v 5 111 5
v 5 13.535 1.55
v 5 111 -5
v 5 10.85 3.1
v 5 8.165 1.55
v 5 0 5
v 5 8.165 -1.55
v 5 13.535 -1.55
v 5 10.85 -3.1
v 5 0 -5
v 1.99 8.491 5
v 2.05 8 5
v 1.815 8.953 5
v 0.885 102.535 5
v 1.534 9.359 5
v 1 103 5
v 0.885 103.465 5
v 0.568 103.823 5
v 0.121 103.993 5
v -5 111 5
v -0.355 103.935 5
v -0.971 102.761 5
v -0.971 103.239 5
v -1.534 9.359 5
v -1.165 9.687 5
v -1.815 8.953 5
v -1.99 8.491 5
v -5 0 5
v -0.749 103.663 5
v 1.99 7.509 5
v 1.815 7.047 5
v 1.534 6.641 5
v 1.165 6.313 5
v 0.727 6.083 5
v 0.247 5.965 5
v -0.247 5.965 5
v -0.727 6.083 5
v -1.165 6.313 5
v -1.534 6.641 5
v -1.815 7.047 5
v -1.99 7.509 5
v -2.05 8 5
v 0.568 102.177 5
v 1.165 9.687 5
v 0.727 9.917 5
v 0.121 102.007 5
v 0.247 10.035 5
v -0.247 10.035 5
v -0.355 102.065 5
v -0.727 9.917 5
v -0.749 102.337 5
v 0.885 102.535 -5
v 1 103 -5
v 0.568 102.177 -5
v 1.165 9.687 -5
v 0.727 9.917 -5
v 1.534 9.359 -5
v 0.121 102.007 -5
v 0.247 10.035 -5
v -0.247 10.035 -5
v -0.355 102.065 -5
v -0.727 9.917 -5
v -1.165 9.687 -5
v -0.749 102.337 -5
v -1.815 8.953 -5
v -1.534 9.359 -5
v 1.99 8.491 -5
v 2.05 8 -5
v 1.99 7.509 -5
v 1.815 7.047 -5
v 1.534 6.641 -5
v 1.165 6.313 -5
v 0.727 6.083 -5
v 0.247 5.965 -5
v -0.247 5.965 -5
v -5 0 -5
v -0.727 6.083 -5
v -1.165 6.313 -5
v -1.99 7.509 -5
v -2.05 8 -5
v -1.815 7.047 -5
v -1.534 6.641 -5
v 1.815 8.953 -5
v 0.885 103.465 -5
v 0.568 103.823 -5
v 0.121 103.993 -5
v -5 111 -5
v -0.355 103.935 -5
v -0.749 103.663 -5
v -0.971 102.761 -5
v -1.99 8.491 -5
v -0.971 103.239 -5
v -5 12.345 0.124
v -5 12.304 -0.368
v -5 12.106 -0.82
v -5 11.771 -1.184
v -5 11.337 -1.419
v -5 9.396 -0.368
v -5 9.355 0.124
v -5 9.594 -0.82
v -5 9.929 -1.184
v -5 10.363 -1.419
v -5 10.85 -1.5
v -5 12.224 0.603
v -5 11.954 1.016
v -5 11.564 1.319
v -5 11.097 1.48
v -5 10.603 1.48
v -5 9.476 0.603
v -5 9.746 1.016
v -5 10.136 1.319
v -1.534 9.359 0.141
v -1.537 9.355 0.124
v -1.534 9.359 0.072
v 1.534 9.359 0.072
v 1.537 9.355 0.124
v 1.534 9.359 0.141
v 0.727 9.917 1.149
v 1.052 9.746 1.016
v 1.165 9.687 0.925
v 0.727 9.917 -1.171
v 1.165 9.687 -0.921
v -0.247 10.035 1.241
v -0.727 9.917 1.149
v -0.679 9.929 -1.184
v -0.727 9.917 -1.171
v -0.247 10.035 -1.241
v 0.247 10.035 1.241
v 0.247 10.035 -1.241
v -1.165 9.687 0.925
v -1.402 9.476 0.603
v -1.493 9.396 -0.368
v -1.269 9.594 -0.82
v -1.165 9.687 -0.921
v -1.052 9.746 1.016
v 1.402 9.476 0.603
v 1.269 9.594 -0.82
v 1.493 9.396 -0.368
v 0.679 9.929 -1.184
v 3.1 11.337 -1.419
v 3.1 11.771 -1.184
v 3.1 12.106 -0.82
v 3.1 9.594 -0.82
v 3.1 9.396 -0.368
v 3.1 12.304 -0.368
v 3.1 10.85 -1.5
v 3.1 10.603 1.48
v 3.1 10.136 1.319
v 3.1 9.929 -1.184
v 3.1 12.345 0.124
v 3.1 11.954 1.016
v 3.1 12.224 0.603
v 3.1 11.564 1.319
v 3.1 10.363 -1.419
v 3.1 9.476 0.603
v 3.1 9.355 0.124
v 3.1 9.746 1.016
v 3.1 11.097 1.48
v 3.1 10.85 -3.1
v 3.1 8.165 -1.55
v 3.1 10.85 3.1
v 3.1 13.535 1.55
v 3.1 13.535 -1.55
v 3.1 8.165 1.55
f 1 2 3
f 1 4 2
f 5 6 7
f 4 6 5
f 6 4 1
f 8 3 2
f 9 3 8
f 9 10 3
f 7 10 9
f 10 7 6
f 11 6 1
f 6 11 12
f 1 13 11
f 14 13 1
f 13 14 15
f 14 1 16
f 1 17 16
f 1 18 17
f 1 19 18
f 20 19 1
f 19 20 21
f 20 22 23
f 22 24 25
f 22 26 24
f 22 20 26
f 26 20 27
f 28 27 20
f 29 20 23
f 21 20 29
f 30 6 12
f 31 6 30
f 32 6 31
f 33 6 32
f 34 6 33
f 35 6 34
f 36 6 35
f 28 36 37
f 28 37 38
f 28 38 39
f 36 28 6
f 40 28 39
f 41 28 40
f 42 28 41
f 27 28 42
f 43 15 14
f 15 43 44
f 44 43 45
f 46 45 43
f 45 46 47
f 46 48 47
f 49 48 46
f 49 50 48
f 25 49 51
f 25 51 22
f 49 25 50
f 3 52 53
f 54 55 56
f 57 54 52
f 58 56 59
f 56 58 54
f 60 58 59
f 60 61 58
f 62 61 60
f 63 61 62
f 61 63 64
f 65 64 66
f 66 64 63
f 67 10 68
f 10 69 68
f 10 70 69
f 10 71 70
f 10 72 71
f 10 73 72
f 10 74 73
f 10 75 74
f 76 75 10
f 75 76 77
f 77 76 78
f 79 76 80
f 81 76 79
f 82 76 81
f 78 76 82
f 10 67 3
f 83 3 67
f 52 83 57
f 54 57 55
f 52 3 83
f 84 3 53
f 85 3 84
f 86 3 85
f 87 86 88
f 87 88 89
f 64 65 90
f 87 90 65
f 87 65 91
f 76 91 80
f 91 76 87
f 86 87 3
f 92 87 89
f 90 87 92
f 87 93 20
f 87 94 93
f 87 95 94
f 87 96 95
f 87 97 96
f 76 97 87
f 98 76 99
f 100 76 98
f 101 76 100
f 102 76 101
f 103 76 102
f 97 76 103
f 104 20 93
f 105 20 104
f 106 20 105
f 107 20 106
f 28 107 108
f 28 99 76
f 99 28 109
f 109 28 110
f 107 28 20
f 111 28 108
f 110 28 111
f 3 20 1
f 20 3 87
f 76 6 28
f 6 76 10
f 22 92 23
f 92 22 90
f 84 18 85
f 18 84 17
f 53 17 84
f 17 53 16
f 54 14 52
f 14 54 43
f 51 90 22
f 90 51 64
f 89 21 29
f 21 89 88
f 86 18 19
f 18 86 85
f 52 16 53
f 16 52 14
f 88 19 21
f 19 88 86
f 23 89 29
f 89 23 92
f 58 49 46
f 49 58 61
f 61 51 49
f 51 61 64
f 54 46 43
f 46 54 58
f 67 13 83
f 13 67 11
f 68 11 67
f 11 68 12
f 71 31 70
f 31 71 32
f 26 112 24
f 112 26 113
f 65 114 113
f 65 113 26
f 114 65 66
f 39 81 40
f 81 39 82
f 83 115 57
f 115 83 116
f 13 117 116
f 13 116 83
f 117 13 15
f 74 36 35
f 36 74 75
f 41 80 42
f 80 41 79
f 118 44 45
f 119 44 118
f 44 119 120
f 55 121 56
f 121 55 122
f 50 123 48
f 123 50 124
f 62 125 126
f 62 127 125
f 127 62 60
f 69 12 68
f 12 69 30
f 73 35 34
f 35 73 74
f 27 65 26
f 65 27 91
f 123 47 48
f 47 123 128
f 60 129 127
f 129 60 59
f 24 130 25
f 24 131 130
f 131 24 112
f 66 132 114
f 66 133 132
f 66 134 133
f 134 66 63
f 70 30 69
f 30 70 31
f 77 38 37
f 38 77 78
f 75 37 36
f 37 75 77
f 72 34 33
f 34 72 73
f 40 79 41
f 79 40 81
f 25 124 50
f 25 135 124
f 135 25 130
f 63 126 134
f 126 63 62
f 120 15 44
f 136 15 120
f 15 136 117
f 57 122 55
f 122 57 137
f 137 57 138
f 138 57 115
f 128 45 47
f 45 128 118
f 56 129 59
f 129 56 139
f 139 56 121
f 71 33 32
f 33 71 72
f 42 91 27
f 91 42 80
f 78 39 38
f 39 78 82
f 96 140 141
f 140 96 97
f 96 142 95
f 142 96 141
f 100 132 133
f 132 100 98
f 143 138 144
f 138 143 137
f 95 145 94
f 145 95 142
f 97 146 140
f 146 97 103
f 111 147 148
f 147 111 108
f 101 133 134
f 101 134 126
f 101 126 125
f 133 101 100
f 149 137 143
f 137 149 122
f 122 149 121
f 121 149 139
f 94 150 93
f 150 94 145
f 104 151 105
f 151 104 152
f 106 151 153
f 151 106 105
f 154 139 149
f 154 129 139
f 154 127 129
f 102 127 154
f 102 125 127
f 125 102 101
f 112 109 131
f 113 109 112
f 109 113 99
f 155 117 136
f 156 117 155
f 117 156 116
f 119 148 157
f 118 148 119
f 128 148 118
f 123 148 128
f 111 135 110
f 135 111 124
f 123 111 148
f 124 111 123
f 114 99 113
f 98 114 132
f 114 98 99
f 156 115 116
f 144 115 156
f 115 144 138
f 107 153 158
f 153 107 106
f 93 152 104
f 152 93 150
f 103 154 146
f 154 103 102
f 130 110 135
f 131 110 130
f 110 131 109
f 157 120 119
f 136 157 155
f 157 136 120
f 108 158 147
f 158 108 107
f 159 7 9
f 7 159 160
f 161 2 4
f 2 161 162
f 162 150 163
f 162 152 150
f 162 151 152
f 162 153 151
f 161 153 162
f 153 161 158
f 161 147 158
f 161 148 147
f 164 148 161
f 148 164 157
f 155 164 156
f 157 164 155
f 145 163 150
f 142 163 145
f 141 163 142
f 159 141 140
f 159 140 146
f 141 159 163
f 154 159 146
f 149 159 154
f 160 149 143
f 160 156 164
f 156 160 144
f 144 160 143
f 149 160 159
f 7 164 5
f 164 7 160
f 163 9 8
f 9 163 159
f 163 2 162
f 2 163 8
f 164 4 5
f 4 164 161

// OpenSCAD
$fa=0.5; // default minimum facet angle is now 0.5
$fs=0.5; // default minimum facet size is now 0.5 mm

holes_distance = 95;

arm_width = 10;
string_hole_d = 2;
string_distance = 8;

engine_hole_d = 4.1;
engine_hole_distance = 8;
engine_hole_notch = engine_hole_d - 3.4;

arm_length = holes_distance + engine_hole_distance + string_distance;

engine_screw_d = 3;
engine_bolt_d = 6.2;
engine_bolt_depth = 2.4;

engine_screw_center = engine_hole_distance+engine_screw_d/2+engine_hole_d/2-engine_hole_notch;

difference()
{
    translate([-arm_width/2,0,-arm_width/2]) cube([arm_width, arm_length, arm_width]);
    translate([0,arm_length-string_distance,-arm_width/2-1]) cylinder(d=string_hole_d, h = arm_width+2);
    translate([0,engine_hole_distance,-arm_width/2-1]) cylinder(d=engine_hole_d, h = arm_width+2);
    translate([-arm_width/2-1,engine_screw_center,0]) rotate([0,90,0]) cylinder(d=engine_screw_d, h = arm_width+2);
    translate([arm_width/2-engine_bolt_depth/2+1,engine_screw_center,0]) rotate([0,90,0]) cylinder(d=engine_bolt_d,h=engine_bolt_depth+1,center=true,$fn=6);
}
